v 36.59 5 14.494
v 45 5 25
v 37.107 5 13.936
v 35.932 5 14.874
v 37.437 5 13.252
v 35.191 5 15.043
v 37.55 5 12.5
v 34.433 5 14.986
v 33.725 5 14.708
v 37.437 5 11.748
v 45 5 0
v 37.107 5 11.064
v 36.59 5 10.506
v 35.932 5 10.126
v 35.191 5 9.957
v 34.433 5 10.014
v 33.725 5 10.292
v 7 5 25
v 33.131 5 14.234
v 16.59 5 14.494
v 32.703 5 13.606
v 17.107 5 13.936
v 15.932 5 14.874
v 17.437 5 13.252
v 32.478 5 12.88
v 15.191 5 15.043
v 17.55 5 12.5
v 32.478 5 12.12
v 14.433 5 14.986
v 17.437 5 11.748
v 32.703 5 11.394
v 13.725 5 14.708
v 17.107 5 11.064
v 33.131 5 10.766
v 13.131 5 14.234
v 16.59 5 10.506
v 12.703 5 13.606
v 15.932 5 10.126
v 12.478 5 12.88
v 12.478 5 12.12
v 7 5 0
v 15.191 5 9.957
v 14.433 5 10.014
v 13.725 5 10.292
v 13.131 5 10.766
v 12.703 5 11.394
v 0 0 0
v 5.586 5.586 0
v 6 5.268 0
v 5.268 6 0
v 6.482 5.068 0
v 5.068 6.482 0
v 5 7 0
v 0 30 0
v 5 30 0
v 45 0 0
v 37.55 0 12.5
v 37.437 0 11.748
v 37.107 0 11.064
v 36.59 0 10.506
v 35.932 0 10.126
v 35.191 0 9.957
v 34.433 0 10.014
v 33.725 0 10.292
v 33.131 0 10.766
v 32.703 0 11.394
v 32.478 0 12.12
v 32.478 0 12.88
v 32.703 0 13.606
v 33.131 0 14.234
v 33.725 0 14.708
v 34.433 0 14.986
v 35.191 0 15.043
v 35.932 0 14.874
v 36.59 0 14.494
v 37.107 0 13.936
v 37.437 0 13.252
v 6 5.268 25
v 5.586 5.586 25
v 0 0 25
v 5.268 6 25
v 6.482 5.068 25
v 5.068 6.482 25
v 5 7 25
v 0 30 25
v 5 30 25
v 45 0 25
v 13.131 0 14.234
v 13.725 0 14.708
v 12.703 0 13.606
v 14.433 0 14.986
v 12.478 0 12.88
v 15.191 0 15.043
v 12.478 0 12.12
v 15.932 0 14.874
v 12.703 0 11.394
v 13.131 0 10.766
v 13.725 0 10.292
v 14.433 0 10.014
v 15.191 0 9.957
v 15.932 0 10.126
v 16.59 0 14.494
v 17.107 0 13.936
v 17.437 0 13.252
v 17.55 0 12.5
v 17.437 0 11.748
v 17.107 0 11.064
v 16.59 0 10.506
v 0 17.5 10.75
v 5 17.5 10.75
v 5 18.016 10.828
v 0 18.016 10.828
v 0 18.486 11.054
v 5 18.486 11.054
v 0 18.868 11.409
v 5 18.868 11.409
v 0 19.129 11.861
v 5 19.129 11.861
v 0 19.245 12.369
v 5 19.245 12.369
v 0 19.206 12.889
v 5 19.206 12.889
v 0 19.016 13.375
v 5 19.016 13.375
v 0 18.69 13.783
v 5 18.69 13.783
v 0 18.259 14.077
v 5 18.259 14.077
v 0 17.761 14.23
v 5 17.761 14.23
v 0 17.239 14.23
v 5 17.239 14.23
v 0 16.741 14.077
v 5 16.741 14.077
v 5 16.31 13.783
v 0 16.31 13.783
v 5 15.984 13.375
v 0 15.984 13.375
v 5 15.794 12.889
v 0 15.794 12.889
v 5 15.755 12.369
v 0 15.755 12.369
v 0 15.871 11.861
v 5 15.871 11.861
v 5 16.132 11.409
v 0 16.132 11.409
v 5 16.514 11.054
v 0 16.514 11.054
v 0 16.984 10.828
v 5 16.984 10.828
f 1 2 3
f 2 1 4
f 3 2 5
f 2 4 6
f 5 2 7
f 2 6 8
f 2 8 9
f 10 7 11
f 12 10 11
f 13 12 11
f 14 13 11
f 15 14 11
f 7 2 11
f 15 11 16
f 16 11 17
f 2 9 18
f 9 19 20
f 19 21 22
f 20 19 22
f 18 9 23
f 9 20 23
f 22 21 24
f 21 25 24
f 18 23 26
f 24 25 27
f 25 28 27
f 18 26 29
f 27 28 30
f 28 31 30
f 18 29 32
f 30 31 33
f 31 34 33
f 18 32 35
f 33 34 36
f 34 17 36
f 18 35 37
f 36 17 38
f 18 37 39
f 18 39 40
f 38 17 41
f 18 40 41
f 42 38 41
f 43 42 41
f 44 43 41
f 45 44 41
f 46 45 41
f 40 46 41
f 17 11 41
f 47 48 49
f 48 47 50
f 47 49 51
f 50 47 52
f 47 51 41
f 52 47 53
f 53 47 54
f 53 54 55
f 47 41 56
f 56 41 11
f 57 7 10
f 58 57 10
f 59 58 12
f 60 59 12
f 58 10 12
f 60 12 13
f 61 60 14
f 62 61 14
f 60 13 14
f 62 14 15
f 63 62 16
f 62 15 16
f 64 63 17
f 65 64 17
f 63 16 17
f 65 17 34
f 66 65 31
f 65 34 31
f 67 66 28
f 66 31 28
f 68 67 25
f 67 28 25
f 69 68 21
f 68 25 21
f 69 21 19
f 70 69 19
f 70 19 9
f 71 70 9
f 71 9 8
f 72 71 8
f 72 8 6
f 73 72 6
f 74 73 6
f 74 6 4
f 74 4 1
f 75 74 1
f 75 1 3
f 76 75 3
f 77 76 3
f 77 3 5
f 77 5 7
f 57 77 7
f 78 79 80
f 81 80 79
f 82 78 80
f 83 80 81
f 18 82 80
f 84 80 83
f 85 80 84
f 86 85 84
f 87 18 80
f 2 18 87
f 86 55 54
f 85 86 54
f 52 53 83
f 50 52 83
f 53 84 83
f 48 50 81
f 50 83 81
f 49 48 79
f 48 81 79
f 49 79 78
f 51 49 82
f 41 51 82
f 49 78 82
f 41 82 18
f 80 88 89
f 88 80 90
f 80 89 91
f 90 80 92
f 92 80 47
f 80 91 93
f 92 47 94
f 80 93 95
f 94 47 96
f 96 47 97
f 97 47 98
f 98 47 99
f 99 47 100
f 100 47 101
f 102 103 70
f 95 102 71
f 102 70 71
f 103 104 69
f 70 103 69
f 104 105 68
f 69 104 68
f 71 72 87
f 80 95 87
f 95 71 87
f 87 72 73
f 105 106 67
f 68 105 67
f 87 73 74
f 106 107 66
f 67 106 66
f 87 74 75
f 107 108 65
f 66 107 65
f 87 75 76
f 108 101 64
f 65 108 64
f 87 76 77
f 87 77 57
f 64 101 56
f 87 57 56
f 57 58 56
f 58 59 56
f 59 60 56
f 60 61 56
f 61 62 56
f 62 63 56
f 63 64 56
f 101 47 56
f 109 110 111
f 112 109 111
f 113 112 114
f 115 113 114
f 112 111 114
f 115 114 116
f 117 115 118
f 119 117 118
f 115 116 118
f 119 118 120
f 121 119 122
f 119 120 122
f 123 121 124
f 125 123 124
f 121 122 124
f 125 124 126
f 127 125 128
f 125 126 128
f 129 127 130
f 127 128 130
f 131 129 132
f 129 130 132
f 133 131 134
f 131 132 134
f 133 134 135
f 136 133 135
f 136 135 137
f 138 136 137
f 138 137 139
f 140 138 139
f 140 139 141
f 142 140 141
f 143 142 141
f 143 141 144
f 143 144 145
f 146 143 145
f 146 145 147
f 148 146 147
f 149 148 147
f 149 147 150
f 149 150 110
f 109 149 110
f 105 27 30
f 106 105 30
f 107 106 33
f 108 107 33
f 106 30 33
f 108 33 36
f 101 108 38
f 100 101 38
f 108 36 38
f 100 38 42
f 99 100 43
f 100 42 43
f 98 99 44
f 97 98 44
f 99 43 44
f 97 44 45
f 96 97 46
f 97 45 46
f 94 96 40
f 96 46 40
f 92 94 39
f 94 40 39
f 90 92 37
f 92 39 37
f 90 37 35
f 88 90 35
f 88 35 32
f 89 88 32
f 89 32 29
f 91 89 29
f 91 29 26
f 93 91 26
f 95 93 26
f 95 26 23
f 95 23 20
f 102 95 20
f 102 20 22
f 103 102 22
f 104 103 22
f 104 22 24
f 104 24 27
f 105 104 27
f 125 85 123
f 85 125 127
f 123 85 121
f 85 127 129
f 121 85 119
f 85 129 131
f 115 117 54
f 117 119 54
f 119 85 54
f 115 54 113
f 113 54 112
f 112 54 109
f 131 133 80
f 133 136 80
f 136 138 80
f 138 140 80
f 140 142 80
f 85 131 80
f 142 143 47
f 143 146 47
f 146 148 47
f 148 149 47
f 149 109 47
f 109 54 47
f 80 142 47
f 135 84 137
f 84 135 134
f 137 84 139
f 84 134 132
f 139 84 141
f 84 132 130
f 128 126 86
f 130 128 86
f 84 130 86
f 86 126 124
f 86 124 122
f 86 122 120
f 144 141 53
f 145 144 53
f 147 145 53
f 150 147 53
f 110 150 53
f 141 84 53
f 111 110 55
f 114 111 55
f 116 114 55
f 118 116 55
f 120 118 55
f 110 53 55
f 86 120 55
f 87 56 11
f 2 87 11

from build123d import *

# Parameters (mm, degrees)
BOSS_EXTRUDE1_DEPTH = 25
SKETCH2_R           = 1.75
CUT_EXTRUDE1_DEPTH  = 25
FILLET1_R           = 2
SKETCH4_R           = 2.55
CUT_EXTRUDE2_DEPTH  = 25


with BuildPart() as part:
    # Sketch1 → Boss-Extrude1 (new body)
    with BuildSketch(Plane.XY):
        Polygon((0, 30), (0, 0), (45, 0), (45, 5), (5, 5), (5, 30), align=None)
    extrude(amount=BOSS_EXTRUDE1_DEPTH)

    # Sketch2 → Cut-Extrude1 (cut)
    with BuildSketch(Plane(origin=(5, 0, 0), x_dir=(0, 0, -1), z_dir=(1, 0, 0))):
        with Locations((-12.5, 17.5)):
            Circle(SKETCH2_R)
    extrude(amount=-CUT_EXTRUDE1_DEPTH, mode=Mode.SUBTRACT)

    # Fillet1
    fillet1_edges = [part.edges().sort_by_distance(p)[0] for p in [
        (5, 5, 12.5),
    ]]
    fillet(fillet1_edges, radius=FILLET1_R)

    # Sketch4 → Cut-Extrude2 (cut)
    with BuildSketch(Plane(origin=(0, 5, 0), x_dir=(1, 0, 0), z_dir=(0, 1, 0))):
        with Locations((35, -12.5)):
            Circle(SKETCH4_R)
        with Locations((15, -12.5)):
            Circle(SKETCH4_R)
    extrude(amount=-CUT_EXTRUDE2_DEPTH, mode=Mode.SUBTRACT)


solid = part.part
